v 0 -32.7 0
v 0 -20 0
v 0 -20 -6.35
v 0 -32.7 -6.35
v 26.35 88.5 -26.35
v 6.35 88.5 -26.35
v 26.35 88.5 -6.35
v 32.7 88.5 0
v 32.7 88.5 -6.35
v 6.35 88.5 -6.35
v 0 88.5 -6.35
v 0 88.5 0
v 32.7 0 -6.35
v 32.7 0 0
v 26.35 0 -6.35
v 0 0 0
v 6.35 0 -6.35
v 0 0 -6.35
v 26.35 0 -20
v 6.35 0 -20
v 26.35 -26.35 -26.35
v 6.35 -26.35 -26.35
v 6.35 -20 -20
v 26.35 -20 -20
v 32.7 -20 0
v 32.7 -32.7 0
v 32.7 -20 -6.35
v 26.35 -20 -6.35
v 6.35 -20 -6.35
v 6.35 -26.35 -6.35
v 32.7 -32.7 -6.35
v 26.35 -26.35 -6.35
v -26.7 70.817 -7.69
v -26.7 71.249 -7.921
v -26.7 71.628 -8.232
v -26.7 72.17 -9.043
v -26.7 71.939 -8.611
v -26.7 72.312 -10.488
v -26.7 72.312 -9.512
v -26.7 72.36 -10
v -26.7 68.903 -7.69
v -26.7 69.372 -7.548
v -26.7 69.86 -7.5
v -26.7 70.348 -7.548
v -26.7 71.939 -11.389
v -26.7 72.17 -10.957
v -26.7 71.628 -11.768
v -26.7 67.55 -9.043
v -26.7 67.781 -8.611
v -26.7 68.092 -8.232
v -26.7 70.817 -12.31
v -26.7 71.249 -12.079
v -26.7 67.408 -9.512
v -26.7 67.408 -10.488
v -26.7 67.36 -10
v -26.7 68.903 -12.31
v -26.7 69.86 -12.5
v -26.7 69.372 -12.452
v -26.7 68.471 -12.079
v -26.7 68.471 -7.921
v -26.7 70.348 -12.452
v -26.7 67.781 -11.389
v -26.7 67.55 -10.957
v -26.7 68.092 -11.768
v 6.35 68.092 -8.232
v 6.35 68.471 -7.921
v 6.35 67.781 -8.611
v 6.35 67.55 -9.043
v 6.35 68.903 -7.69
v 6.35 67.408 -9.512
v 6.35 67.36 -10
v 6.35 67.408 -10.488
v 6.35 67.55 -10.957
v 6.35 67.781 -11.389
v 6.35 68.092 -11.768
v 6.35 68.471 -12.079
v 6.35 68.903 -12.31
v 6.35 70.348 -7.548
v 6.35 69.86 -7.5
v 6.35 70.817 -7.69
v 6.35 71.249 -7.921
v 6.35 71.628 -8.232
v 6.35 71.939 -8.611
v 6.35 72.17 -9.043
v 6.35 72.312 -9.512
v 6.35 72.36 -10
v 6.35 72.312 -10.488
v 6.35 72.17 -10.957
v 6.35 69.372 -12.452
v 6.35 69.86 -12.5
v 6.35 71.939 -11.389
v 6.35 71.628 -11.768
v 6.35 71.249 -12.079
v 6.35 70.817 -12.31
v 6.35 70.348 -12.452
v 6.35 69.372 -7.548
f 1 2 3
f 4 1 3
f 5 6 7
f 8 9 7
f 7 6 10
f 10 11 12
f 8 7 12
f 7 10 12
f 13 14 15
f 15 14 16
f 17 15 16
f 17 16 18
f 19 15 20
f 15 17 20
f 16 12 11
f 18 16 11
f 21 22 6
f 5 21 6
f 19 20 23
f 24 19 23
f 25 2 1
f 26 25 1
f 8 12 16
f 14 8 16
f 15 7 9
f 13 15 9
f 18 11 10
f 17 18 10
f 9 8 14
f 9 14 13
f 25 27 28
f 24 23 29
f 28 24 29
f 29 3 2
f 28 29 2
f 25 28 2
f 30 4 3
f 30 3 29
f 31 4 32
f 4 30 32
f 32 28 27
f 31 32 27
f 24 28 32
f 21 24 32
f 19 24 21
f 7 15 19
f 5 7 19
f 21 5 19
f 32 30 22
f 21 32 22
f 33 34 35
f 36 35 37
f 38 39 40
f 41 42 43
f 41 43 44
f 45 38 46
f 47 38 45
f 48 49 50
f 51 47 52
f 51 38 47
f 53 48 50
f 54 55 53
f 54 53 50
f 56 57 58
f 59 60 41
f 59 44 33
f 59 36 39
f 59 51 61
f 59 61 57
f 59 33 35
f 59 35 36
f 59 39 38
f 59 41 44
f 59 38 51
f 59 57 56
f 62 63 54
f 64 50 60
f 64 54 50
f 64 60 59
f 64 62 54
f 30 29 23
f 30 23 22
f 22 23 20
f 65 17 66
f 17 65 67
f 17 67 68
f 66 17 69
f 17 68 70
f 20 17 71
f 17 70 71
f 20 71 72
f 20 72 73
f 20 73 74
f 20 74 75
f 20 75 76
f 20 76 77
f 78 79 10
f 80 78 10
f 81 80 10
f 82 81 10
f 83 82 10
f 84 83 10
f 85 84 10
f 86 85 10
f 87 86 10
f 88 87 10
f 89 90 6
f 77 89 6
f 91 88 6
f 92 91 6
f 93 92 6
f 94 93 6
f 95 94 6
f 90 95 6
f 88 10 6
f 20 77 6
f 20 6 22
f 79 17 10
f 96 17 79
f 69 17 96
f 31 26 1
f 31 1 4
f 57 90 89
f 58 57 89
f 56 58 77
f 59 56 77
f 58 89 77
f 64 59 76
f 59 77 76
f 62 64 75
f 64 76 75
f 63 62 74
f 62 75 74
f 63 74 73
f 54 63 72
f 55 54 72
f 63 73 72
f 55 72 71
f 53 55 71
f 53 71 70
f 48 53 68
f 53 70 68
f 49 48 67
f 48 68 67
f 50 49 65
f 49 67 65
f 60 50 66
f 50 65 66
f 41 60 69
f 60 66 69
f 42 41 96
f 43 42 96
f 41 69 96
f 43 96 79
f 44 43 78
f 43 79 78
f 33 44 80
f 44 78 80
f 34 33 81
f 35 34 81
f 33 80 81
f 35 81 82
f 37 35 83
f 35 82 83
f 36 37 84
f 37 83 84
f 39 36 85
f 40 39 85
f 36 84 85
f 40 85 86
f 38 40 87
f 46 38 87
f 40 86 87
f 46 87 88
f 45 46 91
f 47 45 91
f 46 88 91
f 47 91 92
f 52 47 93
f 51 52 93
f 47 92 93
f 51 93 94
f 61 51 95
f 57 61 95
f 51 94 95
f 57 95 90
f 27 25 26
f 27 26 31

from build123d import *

# Parameters (mm, degrees)
BOSS_EXTRUDE1_DEPTH = 32.7
SKETCH3_W           = 6.35
SKETCH3_H           = 20
CUT_EXTRUDE2_DEPTH  = 129.269452716
SKETCH7_R           = 2.5
BOSS_EXTRUDE4_DEPTH = 33.05


with BuildPart() as part:
    # Sketch2 → Boss-Extrude1 (new body)
    with BuildSketch(Plane(origin=(0, 0, 0), x_dir=(0, 0, -1), z_dir=(1, 0, 0))):
        Polygon((0, 0), (20, 0), (20, -20), (0, -20), (0, -32.7), (6.35, -32.7), (6.35, -26.35), (26.35, -26.35), (26.35, 88.5), (0, 88.5), align=None)
    extrude(amount=BOSS_EXTRUDE1_DEPTH)

    # Sketch3 → Cut-Extrude2 (cut, through all)
    with BuildSketch(Plane(origin=(0, 88.5, 0), x_dir=(1, 0, 0), z_dir=(0, 1, 0))):
        with Locations((3.175, 16.35)):
            Rectangle(SKETCH3_W, SKETCH3_H)
        with Locations((29.525, 16.35)):
            Rectangle(SKETCH3_W, SKETCH3_H)
    extrude(amount=-CUT_EXTRUDE2_DEPTH, mode=Mode.SUBTRACT)

    # Sketch7 → Boss-Extrude4 (add)
    with BuildSketch(Plane.ZY.offset(-6.35)):
        with Locations(Location((-10, 69.86, 0), (0, 0, 180))):
            Circle(SKETCH7_R)
    extrude(amount=BOSS_EXTRUDE4_DEPTH)


solid = part.part
